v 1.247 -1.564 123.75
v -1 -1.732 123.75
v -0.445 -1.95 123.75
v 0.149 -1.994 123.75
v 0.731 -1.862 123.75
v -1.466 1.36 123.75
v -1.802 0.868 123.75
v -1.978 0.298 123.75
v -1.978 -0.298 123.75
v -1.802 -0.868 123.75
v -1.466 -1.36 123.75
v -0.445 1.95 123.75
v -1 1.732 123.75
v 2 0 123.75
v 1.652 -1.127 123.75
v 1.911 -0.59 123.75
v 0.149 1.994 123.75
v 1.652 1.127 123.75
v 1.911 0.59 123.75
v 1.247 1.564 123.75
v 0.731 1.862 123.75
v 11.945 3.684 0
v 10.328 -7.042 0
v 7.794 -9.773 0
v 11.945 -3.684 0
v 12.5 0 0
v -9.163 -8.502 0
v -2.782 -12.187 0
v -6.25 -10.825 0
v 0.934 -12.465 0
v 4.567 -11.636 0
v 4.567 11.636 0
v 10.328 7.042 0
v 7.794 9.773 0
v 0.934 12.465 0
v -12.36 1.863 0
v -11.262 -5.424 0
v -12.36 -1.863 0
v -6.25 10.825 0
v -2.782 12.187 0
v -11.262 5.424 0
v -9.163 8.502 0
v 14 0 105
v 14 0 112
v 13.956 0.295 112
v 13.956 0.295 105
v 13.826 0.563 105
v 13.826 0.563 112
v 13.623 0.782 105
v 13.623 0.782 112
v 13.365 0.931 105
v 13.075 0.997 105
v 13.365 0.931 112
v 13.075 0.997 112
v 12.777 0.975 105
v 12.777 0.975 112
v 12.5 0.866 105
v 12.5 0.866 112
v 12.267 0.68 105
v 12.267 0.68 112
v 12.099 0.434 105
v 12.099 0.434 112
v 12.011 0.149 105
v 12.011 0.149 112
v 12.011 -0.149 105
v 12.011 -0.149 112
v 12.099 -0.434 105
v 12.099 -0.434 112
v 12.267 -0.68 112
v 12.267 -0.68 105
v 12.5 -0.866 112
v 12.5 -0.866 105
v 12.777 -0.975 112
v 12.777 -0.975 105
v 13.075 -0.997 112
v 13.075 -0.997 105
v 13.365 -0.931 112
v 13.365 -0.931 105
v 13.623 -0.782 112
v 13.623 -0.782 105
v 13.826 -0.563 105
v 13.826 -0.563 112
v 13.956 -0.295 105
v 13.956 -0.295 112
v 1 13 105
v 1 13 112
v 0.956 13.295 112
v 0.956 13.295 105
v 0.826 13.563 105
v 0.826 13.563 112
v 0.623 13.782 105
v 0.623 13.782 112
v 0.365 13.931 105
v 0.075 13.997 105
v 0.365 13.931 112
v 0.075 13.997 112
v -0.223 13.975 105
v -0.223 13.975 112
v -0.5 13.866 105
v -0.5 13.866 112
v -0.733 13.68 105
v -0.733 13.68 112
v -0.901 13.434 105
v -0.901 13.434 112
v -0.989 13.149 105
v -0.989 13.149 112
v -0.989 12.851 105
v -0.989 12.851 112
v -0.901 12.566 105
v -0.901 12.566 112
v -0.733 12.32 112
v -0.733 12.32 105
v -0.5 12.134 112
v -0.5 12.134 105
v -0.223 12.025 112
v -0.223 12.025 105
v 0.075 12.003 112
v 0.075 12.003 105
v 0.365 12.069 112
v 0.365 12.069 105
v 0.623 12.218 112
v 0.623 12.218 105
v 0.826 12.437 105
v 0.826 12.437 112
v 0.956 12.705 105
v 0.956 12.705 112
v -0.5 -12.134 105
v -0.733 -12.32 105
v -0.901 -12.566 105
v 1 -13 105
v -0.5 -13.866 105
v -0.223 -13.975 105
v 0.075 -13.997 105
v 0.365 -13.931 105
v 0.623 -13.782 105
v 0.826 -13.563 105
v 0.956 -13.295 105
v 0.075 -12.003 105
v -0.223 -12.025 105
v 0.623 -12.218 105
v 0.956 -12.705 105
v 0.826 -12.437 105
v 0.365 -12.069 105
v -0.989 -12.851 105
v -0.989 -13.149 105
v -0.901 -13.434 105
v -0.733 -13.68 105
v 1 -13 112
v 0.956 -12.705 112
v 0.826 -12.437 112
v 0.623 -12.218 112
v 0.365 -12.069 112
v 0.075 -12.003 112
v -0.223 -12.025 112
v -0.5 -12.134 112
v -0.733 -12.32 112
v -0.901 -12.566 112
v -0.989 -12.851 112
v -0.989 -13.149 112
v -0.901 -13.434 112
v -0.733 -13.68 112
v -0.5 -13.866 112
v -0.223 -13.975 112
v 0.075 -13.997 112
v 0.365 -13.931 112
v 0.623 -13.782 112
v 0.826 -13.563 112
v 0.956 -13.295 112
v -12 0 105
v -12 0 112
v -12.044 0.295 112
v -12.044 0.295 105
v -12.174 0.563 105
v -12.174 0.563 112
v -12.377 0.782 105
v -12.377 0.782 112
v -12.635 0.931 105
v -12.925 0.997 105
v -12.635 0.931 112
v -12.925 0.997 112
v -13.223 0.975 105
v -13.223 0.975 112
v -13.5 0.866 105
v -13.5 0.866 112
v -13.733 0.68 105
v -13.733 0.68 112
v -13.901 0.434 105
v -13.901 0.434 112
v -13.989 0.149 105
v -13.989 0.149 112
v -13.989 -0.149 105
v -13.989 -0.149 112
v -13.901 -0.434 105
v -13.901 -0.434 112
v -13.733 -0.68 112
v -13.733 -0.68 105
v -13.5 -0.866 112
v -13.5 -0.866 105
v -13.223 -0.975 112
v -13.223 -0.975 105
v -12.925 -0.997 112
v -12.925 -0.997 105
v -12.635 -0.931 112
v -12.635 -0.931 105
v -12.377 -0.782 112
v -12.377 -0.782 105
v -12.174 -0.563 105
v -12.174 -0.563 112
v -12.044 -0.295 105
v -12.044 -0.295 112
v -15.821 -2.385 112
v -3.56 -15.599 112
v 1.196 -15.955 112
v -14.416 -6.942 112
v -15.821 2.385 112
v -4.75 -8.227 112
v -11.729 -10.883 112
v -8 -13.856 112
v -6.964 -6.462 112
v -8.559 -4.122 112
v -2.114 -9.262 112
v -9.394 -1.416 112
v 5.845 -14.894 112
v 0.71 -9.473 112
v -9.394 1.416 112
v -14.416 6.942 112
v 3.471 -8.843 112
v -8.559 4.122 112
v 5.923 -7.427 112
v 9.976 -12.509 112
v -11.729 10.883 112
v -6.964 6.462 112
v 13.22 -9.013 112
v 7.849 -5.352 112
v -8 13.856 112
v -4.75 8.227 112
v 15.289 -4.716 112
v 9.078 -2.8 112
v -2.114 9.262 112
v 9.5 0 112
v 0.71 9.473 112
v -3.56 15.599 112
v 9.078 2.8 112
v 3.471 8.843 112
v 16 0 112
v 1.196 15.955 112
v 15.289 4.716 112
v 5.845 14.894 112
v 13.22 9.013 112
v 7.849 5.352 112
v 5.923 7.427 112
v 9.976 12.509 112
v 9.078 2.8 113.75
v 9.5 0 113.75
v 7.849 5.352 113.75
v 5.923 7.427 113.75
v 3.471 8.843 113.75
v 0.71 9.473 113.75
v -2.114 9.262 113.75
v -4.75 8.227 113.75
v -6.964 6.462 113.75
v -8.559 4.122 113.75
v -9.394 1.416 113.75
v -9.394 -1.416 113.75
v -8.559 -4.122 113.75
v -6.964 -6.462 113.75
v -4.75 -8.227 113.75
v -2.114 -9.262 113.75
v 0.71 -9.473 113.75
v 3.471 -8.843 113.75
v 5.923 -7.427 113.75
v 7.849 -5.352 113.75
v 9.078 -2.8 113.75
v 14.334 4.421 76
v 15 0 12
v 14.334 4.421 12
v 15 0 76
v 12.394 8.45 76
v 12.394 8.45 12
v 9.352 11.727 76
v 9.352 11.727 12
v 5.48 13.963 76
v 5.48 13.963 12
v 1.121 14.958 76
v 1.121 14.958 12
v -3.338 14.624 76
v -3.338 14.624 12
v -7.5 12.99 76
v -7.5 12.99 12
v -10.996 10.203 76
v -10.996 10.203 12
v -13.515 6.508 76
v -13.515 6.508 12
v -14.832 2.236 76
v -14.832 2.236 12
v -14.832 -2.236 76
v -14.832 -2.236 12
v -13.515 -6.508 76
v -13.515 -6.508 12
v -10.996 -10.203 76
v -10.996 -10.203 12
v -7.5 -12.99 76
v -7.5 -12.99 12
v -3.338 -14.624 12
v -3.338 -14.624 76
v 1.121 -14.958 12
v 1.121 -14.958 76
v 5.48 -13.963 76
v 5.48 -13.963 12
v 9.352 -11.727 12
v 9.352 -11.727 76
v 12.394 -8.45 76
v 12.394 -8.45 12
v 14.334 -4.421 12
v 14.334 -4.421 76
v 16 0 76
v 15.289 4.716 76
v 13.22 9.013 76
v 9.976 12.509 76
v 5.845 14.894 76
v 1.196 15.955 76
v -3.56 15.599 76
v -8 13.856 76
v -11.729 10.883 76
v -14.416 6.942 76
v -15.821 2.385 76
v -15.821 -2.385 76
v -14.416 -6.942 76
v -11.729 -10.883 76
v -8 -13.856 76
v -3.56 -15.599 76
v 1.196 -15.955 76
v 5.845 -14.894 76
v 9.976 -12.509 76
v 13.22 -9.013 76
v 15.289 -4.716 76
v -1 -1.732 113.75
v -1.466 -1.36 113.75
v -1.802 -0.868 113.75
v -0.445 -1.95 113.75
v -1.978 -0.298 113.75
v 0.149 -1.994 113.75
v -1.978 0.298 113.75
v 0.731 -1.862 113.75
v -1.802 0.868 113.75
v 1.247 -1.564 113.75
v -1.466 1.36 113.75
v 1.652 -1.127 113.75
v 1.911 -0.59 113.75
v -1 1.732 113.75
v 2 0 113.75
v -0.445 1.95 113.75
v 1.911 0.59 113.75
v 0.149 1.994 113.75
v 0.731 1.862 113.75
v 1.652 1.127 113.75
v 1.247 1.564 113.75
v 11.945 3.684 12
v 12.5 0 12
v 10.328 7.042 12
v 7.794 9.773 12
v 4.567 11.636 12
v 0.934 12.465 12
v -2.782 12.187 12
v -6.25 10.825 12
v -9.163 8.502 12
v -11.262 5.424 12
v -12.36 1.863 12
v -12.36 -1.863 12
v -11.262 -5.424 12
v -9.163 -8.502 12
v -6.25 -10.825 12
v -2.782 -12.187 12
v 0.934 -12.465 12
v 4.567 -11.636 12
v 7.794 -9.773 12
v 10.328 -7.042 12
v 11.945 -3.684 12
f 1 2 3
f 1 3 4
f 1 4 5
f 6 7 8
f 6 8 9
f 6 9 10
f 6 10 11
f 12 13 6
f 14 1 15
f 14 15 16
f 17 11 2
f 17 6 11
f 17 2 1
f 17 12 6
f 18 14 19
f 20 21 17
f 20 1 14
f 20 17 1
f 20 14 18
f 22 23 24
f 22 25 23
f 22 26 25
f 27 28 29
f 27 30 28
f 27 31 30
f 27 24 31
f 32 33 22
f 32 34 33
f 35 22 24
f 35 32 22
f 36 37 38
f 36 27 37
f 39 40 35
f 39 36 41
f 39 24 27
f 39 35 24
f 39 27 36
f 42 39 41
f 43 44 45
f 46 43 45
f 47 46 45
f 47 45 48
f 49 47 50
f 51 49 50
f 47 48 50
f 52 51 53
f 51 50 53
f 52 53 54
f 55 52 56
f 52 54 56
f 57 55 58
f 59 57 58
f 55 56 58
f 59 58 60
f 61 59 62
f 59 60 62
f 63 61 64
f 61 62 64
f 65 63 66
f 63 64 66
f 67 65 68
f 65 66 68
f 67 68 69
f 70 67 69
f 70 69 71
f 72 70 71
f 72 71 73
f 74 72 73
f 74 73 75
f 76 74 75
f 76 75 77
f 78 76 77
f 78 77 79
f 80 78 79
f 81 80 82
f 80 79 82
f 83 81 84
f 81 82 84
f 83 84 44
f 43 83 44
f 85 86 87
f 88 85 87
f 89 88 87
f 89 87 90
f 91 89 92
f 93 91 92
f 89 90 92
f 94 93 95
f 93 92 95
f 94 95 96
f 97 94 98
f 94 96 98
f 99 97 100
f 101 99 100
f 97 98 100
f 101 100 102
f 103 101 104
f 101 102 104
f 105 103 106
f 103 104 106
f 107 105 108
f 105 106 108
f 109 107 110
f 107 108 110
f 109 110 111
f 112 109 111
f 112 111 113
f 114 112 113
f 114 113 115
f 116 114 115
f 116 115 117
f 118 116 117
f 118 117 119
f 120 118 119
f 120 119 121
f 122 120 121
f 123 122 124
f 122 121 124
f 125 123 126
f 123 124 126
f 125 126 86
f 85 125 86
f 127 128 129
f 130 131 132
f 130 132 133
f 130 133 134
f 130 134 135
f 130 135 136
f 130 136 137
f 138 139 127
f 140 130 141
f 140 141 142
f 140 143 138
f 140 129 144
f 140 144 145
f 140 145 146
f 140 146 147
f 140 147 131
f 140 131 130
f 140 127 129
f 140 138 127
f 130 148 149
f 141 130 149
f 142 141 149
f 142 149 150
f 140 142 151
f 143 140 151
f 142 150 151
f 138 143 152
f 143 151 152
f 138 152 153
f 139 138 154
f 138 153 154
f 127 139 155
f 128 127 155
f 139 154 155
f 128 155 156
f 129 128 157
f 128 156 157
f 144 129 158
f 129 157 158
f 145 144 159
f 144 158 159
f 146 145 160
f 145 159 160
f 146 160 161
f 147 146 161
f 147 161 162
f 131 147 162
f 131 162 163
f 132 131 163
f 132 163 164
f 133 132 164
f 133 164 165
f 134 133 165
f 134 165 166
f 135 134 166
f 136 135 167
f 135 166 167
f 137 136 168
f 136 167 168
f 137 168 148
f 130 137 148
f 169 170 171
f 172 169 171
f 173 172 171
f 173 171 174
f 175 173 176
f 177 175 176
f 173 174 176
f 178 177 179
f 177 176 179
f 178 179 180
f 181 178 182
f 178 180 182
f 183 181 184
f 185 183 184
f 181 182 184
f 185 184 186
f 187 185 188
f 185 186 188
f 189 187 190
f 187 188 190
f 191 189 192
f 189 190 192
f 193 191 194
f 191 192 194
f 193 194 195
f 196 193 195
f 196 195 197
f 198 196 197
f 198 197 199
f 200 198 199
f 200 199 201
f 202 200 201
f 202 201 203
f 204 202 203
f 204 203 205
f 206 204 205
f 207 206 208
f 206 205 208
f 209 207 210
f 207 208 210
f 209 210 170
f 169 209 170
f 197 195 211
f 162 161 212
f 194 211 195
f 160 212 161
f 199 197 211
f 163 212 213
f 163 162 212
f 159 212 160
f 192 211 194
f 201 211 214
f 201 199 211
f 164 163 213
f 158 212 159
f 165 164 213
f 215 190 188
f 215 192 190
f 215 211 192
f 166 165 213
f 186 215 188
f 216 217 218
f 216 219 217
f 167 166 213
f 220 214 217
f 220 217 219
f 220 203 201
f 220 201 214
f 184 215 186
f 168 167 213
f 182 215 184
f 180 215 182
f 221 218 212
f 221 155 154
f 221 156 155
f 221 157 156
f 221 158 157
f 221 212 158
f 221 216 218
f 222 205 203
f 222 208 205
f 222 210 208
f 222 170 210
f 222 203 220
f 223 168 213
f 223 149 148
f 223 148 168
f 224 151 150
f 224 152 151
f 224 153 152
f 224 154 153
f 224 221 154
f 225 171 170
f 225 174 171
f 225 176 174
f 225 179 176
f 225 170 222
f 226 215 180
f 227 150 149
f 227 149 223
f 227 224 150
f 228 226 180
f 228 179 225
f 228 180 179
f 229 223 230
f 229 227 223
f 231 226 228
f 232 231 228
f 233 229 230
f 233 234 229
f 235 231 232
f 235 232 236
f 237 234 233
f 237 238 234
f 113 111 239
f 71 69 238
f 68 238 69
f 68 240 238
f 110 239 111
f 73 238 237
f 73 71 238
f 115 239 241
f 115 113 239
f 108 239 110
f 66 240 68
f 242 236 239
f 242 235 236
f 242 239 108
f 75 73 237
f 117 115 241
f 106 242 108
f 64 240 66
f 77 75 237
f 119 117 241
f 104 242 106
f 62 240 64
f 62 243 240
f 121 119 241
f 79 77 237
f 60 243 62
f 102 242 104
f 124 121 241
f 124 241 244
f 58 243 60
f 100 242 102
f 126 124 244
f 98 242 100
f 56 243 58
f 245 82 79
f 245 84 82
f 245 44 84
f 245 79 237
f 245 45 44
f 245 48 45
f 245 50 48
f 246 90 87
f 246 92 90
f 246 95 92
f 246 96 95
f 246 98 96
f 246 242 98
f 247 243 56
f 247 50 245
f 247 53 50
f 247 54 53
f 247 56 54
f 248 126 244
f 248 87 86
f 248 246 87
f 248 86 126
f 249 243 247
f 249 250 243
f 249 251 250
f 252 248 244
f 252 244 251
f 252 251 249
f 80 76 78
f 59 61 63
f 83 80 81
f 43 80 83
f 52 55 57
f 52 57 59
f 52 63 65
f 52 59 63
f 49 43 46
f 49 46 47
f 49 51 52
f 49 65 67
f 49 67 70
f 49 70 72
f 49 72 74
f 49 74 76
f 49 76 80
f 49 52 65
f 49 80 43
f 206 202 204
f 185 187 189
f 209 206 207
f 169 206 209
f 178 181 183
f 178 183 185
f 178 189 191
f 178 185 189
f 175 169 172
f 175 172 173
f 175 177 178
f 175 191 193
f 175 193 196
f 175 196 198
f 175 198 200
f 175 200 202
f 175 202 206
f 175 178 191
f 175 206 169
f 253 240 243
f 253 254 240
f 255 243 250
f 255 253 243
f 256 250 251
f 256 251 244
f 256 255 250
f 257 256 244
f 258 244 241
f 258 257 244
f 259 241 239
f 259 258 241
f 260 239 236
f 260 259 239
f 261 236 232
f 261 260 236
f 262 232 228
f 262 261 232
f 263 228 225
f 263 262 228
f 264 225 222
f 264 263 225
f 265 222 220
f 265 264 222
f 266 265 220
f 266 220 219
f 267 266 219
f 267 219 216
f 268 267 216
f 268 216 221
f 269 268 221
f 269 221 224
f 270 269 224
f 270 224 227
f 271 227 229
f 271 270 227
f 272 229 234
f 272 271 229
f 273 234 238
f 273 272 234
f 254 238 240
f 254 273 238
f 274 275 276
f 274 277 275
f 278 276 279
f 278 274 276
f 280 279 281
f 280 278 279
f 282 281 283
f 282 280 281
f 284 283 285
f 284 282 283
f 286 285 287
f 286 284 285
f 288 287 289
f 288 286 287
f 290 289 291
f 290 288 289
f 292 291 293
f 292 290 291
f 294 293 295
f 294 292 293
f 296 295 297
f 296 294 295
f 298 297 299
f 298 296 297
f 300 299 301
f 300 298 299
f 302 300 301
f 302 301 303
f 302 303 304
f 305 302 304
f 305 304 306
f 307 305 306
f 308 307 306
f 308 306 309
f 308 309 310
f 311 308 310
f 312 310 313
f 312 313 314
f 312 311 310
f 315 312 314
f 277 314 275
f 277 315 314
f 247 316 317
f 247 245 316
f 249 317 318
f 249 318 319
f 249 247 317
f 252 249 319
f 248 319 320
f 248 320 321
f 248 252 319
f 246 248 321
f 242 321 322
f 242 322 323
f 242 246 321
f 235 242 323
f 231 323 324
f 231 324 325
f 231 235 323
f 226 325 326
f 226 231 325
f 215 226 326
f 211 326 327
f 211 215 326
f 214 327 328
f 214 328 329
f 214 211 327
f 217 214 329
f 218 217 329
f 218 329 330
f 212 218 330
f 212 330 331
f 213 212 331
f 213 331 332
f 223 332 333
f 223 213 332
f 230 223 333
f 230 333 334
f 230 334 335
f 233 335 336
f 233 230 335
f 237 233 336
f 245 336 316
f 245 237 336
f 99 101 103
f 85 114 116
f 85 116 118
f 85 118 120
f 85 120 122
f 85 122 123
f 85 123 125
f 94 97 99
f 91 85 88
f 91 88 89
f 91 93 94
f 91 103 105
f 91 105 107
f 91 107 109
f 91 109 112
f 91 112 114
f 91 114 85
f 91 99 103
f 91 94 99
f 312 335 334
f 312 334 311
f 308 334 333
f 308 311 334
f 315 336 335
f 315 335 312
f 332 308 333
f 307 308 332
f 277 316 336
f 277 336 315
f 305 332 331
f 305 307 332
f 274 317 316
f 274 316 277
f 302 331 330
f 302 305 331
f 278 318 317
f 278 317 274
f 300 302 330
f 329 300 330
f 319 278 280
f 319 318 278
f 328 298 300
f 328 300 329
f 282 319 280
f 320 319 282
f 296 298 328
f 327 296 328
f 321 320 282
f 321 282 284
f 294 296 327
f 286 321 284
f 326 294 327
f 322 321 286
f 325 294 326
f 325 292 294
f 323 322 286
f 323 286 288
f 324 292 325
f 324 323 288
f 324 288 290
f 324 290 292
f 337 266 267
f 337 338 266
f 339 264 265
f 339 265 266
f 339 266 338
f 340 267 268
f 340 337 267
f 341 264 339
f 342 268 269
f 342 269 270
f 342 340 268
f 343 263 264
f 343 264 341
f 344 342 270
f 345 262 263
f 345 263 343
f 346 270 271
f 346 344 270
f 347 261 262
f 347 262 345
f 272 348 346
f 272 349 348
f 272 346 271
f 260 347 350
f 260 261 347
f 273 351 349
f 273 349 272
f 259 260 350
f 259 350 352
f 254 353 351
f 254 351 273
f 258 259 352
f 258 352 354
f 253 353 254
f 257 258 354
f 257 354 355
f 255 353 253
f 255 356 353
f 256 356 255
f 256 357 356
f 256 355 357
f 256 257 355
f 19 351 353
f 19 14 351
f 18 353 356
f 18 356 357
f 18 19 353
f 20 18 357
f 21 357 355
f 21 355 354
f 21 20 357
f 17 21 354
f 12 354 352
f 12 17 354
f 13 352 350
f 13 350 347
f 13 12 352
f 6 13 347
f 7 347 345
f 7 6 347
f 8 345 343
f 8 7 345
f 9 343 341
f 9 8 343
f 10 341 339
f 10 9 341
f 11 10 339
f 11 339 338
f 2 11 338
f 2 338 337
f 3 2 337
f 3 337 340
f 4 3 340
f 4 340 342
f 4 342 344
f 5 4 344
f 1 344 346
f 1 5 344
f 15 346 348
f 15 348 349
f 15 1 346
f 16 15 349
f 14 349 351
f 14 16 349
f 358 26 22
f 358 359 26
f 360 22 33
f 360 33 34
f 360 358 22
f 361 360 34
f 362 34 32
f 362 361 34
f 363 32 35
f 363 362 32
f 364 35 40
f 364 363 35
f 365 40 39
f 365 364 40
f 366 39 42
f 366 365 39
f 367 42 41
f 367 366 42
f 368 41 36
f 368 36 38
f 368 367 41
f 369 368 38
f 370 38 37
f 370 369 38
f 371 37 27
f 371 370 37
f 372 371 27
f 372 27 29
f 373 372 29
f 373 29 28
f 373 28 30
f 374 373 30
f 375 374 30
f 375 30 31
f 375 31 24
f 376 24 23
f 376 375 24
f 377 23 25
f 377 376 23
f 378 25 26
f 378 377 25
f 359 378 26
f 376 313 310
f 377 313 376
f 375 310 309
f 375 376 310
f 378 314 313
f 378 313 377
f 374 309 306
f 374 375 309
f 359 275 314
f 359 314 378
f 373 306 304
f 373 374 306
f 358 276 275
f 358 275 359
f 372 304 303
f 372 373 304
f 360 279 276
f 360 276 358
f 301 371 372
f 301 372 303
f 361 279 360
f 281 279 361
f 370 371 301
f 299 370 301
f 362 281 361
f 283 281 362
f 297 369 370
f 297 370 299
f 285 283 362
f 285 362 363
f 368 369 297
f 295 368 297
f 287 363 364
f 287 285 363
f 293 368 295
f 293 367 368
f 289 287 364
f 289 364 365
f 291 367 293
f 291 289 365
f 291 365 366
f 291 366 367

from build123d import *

# Parameters (mm, degrees)
F2_R     = 1
F3_DEPTH = 7


with BuildPart() as f1:
    # F0 (on Front) → F1 (revolve)
    with BuildSketch(Plane.XZ):
        Polygon((2, 123.75), (0, 123.75), (0, 0), (12.5, 0), (12.5, 12), (15, 12), (15, 76), (16, 76), (16, 112), (9.5, 112), (9.5, 113.75), (2, 113.75), align=None)
    revolve(axis=Axis((0, 0, 70.364535), (0, 0, 1)))

    # F2 (on face) → F3 (cut)
    with BuildSketch(Plane.XY.offset(112)):
        with Locations((0, 13)):
            Circle(F2_R)
        with Locations((13, 0)):
            Circle(F2_R)
        with Locations((-13, 0)):
            Circle(F2_R)
        with Locations((0, -13)):
            Circle(F2_R)
    extrude(amount=-F3_DEPTH, mode=Mode.SUBTRACT)


solid = f1.part
